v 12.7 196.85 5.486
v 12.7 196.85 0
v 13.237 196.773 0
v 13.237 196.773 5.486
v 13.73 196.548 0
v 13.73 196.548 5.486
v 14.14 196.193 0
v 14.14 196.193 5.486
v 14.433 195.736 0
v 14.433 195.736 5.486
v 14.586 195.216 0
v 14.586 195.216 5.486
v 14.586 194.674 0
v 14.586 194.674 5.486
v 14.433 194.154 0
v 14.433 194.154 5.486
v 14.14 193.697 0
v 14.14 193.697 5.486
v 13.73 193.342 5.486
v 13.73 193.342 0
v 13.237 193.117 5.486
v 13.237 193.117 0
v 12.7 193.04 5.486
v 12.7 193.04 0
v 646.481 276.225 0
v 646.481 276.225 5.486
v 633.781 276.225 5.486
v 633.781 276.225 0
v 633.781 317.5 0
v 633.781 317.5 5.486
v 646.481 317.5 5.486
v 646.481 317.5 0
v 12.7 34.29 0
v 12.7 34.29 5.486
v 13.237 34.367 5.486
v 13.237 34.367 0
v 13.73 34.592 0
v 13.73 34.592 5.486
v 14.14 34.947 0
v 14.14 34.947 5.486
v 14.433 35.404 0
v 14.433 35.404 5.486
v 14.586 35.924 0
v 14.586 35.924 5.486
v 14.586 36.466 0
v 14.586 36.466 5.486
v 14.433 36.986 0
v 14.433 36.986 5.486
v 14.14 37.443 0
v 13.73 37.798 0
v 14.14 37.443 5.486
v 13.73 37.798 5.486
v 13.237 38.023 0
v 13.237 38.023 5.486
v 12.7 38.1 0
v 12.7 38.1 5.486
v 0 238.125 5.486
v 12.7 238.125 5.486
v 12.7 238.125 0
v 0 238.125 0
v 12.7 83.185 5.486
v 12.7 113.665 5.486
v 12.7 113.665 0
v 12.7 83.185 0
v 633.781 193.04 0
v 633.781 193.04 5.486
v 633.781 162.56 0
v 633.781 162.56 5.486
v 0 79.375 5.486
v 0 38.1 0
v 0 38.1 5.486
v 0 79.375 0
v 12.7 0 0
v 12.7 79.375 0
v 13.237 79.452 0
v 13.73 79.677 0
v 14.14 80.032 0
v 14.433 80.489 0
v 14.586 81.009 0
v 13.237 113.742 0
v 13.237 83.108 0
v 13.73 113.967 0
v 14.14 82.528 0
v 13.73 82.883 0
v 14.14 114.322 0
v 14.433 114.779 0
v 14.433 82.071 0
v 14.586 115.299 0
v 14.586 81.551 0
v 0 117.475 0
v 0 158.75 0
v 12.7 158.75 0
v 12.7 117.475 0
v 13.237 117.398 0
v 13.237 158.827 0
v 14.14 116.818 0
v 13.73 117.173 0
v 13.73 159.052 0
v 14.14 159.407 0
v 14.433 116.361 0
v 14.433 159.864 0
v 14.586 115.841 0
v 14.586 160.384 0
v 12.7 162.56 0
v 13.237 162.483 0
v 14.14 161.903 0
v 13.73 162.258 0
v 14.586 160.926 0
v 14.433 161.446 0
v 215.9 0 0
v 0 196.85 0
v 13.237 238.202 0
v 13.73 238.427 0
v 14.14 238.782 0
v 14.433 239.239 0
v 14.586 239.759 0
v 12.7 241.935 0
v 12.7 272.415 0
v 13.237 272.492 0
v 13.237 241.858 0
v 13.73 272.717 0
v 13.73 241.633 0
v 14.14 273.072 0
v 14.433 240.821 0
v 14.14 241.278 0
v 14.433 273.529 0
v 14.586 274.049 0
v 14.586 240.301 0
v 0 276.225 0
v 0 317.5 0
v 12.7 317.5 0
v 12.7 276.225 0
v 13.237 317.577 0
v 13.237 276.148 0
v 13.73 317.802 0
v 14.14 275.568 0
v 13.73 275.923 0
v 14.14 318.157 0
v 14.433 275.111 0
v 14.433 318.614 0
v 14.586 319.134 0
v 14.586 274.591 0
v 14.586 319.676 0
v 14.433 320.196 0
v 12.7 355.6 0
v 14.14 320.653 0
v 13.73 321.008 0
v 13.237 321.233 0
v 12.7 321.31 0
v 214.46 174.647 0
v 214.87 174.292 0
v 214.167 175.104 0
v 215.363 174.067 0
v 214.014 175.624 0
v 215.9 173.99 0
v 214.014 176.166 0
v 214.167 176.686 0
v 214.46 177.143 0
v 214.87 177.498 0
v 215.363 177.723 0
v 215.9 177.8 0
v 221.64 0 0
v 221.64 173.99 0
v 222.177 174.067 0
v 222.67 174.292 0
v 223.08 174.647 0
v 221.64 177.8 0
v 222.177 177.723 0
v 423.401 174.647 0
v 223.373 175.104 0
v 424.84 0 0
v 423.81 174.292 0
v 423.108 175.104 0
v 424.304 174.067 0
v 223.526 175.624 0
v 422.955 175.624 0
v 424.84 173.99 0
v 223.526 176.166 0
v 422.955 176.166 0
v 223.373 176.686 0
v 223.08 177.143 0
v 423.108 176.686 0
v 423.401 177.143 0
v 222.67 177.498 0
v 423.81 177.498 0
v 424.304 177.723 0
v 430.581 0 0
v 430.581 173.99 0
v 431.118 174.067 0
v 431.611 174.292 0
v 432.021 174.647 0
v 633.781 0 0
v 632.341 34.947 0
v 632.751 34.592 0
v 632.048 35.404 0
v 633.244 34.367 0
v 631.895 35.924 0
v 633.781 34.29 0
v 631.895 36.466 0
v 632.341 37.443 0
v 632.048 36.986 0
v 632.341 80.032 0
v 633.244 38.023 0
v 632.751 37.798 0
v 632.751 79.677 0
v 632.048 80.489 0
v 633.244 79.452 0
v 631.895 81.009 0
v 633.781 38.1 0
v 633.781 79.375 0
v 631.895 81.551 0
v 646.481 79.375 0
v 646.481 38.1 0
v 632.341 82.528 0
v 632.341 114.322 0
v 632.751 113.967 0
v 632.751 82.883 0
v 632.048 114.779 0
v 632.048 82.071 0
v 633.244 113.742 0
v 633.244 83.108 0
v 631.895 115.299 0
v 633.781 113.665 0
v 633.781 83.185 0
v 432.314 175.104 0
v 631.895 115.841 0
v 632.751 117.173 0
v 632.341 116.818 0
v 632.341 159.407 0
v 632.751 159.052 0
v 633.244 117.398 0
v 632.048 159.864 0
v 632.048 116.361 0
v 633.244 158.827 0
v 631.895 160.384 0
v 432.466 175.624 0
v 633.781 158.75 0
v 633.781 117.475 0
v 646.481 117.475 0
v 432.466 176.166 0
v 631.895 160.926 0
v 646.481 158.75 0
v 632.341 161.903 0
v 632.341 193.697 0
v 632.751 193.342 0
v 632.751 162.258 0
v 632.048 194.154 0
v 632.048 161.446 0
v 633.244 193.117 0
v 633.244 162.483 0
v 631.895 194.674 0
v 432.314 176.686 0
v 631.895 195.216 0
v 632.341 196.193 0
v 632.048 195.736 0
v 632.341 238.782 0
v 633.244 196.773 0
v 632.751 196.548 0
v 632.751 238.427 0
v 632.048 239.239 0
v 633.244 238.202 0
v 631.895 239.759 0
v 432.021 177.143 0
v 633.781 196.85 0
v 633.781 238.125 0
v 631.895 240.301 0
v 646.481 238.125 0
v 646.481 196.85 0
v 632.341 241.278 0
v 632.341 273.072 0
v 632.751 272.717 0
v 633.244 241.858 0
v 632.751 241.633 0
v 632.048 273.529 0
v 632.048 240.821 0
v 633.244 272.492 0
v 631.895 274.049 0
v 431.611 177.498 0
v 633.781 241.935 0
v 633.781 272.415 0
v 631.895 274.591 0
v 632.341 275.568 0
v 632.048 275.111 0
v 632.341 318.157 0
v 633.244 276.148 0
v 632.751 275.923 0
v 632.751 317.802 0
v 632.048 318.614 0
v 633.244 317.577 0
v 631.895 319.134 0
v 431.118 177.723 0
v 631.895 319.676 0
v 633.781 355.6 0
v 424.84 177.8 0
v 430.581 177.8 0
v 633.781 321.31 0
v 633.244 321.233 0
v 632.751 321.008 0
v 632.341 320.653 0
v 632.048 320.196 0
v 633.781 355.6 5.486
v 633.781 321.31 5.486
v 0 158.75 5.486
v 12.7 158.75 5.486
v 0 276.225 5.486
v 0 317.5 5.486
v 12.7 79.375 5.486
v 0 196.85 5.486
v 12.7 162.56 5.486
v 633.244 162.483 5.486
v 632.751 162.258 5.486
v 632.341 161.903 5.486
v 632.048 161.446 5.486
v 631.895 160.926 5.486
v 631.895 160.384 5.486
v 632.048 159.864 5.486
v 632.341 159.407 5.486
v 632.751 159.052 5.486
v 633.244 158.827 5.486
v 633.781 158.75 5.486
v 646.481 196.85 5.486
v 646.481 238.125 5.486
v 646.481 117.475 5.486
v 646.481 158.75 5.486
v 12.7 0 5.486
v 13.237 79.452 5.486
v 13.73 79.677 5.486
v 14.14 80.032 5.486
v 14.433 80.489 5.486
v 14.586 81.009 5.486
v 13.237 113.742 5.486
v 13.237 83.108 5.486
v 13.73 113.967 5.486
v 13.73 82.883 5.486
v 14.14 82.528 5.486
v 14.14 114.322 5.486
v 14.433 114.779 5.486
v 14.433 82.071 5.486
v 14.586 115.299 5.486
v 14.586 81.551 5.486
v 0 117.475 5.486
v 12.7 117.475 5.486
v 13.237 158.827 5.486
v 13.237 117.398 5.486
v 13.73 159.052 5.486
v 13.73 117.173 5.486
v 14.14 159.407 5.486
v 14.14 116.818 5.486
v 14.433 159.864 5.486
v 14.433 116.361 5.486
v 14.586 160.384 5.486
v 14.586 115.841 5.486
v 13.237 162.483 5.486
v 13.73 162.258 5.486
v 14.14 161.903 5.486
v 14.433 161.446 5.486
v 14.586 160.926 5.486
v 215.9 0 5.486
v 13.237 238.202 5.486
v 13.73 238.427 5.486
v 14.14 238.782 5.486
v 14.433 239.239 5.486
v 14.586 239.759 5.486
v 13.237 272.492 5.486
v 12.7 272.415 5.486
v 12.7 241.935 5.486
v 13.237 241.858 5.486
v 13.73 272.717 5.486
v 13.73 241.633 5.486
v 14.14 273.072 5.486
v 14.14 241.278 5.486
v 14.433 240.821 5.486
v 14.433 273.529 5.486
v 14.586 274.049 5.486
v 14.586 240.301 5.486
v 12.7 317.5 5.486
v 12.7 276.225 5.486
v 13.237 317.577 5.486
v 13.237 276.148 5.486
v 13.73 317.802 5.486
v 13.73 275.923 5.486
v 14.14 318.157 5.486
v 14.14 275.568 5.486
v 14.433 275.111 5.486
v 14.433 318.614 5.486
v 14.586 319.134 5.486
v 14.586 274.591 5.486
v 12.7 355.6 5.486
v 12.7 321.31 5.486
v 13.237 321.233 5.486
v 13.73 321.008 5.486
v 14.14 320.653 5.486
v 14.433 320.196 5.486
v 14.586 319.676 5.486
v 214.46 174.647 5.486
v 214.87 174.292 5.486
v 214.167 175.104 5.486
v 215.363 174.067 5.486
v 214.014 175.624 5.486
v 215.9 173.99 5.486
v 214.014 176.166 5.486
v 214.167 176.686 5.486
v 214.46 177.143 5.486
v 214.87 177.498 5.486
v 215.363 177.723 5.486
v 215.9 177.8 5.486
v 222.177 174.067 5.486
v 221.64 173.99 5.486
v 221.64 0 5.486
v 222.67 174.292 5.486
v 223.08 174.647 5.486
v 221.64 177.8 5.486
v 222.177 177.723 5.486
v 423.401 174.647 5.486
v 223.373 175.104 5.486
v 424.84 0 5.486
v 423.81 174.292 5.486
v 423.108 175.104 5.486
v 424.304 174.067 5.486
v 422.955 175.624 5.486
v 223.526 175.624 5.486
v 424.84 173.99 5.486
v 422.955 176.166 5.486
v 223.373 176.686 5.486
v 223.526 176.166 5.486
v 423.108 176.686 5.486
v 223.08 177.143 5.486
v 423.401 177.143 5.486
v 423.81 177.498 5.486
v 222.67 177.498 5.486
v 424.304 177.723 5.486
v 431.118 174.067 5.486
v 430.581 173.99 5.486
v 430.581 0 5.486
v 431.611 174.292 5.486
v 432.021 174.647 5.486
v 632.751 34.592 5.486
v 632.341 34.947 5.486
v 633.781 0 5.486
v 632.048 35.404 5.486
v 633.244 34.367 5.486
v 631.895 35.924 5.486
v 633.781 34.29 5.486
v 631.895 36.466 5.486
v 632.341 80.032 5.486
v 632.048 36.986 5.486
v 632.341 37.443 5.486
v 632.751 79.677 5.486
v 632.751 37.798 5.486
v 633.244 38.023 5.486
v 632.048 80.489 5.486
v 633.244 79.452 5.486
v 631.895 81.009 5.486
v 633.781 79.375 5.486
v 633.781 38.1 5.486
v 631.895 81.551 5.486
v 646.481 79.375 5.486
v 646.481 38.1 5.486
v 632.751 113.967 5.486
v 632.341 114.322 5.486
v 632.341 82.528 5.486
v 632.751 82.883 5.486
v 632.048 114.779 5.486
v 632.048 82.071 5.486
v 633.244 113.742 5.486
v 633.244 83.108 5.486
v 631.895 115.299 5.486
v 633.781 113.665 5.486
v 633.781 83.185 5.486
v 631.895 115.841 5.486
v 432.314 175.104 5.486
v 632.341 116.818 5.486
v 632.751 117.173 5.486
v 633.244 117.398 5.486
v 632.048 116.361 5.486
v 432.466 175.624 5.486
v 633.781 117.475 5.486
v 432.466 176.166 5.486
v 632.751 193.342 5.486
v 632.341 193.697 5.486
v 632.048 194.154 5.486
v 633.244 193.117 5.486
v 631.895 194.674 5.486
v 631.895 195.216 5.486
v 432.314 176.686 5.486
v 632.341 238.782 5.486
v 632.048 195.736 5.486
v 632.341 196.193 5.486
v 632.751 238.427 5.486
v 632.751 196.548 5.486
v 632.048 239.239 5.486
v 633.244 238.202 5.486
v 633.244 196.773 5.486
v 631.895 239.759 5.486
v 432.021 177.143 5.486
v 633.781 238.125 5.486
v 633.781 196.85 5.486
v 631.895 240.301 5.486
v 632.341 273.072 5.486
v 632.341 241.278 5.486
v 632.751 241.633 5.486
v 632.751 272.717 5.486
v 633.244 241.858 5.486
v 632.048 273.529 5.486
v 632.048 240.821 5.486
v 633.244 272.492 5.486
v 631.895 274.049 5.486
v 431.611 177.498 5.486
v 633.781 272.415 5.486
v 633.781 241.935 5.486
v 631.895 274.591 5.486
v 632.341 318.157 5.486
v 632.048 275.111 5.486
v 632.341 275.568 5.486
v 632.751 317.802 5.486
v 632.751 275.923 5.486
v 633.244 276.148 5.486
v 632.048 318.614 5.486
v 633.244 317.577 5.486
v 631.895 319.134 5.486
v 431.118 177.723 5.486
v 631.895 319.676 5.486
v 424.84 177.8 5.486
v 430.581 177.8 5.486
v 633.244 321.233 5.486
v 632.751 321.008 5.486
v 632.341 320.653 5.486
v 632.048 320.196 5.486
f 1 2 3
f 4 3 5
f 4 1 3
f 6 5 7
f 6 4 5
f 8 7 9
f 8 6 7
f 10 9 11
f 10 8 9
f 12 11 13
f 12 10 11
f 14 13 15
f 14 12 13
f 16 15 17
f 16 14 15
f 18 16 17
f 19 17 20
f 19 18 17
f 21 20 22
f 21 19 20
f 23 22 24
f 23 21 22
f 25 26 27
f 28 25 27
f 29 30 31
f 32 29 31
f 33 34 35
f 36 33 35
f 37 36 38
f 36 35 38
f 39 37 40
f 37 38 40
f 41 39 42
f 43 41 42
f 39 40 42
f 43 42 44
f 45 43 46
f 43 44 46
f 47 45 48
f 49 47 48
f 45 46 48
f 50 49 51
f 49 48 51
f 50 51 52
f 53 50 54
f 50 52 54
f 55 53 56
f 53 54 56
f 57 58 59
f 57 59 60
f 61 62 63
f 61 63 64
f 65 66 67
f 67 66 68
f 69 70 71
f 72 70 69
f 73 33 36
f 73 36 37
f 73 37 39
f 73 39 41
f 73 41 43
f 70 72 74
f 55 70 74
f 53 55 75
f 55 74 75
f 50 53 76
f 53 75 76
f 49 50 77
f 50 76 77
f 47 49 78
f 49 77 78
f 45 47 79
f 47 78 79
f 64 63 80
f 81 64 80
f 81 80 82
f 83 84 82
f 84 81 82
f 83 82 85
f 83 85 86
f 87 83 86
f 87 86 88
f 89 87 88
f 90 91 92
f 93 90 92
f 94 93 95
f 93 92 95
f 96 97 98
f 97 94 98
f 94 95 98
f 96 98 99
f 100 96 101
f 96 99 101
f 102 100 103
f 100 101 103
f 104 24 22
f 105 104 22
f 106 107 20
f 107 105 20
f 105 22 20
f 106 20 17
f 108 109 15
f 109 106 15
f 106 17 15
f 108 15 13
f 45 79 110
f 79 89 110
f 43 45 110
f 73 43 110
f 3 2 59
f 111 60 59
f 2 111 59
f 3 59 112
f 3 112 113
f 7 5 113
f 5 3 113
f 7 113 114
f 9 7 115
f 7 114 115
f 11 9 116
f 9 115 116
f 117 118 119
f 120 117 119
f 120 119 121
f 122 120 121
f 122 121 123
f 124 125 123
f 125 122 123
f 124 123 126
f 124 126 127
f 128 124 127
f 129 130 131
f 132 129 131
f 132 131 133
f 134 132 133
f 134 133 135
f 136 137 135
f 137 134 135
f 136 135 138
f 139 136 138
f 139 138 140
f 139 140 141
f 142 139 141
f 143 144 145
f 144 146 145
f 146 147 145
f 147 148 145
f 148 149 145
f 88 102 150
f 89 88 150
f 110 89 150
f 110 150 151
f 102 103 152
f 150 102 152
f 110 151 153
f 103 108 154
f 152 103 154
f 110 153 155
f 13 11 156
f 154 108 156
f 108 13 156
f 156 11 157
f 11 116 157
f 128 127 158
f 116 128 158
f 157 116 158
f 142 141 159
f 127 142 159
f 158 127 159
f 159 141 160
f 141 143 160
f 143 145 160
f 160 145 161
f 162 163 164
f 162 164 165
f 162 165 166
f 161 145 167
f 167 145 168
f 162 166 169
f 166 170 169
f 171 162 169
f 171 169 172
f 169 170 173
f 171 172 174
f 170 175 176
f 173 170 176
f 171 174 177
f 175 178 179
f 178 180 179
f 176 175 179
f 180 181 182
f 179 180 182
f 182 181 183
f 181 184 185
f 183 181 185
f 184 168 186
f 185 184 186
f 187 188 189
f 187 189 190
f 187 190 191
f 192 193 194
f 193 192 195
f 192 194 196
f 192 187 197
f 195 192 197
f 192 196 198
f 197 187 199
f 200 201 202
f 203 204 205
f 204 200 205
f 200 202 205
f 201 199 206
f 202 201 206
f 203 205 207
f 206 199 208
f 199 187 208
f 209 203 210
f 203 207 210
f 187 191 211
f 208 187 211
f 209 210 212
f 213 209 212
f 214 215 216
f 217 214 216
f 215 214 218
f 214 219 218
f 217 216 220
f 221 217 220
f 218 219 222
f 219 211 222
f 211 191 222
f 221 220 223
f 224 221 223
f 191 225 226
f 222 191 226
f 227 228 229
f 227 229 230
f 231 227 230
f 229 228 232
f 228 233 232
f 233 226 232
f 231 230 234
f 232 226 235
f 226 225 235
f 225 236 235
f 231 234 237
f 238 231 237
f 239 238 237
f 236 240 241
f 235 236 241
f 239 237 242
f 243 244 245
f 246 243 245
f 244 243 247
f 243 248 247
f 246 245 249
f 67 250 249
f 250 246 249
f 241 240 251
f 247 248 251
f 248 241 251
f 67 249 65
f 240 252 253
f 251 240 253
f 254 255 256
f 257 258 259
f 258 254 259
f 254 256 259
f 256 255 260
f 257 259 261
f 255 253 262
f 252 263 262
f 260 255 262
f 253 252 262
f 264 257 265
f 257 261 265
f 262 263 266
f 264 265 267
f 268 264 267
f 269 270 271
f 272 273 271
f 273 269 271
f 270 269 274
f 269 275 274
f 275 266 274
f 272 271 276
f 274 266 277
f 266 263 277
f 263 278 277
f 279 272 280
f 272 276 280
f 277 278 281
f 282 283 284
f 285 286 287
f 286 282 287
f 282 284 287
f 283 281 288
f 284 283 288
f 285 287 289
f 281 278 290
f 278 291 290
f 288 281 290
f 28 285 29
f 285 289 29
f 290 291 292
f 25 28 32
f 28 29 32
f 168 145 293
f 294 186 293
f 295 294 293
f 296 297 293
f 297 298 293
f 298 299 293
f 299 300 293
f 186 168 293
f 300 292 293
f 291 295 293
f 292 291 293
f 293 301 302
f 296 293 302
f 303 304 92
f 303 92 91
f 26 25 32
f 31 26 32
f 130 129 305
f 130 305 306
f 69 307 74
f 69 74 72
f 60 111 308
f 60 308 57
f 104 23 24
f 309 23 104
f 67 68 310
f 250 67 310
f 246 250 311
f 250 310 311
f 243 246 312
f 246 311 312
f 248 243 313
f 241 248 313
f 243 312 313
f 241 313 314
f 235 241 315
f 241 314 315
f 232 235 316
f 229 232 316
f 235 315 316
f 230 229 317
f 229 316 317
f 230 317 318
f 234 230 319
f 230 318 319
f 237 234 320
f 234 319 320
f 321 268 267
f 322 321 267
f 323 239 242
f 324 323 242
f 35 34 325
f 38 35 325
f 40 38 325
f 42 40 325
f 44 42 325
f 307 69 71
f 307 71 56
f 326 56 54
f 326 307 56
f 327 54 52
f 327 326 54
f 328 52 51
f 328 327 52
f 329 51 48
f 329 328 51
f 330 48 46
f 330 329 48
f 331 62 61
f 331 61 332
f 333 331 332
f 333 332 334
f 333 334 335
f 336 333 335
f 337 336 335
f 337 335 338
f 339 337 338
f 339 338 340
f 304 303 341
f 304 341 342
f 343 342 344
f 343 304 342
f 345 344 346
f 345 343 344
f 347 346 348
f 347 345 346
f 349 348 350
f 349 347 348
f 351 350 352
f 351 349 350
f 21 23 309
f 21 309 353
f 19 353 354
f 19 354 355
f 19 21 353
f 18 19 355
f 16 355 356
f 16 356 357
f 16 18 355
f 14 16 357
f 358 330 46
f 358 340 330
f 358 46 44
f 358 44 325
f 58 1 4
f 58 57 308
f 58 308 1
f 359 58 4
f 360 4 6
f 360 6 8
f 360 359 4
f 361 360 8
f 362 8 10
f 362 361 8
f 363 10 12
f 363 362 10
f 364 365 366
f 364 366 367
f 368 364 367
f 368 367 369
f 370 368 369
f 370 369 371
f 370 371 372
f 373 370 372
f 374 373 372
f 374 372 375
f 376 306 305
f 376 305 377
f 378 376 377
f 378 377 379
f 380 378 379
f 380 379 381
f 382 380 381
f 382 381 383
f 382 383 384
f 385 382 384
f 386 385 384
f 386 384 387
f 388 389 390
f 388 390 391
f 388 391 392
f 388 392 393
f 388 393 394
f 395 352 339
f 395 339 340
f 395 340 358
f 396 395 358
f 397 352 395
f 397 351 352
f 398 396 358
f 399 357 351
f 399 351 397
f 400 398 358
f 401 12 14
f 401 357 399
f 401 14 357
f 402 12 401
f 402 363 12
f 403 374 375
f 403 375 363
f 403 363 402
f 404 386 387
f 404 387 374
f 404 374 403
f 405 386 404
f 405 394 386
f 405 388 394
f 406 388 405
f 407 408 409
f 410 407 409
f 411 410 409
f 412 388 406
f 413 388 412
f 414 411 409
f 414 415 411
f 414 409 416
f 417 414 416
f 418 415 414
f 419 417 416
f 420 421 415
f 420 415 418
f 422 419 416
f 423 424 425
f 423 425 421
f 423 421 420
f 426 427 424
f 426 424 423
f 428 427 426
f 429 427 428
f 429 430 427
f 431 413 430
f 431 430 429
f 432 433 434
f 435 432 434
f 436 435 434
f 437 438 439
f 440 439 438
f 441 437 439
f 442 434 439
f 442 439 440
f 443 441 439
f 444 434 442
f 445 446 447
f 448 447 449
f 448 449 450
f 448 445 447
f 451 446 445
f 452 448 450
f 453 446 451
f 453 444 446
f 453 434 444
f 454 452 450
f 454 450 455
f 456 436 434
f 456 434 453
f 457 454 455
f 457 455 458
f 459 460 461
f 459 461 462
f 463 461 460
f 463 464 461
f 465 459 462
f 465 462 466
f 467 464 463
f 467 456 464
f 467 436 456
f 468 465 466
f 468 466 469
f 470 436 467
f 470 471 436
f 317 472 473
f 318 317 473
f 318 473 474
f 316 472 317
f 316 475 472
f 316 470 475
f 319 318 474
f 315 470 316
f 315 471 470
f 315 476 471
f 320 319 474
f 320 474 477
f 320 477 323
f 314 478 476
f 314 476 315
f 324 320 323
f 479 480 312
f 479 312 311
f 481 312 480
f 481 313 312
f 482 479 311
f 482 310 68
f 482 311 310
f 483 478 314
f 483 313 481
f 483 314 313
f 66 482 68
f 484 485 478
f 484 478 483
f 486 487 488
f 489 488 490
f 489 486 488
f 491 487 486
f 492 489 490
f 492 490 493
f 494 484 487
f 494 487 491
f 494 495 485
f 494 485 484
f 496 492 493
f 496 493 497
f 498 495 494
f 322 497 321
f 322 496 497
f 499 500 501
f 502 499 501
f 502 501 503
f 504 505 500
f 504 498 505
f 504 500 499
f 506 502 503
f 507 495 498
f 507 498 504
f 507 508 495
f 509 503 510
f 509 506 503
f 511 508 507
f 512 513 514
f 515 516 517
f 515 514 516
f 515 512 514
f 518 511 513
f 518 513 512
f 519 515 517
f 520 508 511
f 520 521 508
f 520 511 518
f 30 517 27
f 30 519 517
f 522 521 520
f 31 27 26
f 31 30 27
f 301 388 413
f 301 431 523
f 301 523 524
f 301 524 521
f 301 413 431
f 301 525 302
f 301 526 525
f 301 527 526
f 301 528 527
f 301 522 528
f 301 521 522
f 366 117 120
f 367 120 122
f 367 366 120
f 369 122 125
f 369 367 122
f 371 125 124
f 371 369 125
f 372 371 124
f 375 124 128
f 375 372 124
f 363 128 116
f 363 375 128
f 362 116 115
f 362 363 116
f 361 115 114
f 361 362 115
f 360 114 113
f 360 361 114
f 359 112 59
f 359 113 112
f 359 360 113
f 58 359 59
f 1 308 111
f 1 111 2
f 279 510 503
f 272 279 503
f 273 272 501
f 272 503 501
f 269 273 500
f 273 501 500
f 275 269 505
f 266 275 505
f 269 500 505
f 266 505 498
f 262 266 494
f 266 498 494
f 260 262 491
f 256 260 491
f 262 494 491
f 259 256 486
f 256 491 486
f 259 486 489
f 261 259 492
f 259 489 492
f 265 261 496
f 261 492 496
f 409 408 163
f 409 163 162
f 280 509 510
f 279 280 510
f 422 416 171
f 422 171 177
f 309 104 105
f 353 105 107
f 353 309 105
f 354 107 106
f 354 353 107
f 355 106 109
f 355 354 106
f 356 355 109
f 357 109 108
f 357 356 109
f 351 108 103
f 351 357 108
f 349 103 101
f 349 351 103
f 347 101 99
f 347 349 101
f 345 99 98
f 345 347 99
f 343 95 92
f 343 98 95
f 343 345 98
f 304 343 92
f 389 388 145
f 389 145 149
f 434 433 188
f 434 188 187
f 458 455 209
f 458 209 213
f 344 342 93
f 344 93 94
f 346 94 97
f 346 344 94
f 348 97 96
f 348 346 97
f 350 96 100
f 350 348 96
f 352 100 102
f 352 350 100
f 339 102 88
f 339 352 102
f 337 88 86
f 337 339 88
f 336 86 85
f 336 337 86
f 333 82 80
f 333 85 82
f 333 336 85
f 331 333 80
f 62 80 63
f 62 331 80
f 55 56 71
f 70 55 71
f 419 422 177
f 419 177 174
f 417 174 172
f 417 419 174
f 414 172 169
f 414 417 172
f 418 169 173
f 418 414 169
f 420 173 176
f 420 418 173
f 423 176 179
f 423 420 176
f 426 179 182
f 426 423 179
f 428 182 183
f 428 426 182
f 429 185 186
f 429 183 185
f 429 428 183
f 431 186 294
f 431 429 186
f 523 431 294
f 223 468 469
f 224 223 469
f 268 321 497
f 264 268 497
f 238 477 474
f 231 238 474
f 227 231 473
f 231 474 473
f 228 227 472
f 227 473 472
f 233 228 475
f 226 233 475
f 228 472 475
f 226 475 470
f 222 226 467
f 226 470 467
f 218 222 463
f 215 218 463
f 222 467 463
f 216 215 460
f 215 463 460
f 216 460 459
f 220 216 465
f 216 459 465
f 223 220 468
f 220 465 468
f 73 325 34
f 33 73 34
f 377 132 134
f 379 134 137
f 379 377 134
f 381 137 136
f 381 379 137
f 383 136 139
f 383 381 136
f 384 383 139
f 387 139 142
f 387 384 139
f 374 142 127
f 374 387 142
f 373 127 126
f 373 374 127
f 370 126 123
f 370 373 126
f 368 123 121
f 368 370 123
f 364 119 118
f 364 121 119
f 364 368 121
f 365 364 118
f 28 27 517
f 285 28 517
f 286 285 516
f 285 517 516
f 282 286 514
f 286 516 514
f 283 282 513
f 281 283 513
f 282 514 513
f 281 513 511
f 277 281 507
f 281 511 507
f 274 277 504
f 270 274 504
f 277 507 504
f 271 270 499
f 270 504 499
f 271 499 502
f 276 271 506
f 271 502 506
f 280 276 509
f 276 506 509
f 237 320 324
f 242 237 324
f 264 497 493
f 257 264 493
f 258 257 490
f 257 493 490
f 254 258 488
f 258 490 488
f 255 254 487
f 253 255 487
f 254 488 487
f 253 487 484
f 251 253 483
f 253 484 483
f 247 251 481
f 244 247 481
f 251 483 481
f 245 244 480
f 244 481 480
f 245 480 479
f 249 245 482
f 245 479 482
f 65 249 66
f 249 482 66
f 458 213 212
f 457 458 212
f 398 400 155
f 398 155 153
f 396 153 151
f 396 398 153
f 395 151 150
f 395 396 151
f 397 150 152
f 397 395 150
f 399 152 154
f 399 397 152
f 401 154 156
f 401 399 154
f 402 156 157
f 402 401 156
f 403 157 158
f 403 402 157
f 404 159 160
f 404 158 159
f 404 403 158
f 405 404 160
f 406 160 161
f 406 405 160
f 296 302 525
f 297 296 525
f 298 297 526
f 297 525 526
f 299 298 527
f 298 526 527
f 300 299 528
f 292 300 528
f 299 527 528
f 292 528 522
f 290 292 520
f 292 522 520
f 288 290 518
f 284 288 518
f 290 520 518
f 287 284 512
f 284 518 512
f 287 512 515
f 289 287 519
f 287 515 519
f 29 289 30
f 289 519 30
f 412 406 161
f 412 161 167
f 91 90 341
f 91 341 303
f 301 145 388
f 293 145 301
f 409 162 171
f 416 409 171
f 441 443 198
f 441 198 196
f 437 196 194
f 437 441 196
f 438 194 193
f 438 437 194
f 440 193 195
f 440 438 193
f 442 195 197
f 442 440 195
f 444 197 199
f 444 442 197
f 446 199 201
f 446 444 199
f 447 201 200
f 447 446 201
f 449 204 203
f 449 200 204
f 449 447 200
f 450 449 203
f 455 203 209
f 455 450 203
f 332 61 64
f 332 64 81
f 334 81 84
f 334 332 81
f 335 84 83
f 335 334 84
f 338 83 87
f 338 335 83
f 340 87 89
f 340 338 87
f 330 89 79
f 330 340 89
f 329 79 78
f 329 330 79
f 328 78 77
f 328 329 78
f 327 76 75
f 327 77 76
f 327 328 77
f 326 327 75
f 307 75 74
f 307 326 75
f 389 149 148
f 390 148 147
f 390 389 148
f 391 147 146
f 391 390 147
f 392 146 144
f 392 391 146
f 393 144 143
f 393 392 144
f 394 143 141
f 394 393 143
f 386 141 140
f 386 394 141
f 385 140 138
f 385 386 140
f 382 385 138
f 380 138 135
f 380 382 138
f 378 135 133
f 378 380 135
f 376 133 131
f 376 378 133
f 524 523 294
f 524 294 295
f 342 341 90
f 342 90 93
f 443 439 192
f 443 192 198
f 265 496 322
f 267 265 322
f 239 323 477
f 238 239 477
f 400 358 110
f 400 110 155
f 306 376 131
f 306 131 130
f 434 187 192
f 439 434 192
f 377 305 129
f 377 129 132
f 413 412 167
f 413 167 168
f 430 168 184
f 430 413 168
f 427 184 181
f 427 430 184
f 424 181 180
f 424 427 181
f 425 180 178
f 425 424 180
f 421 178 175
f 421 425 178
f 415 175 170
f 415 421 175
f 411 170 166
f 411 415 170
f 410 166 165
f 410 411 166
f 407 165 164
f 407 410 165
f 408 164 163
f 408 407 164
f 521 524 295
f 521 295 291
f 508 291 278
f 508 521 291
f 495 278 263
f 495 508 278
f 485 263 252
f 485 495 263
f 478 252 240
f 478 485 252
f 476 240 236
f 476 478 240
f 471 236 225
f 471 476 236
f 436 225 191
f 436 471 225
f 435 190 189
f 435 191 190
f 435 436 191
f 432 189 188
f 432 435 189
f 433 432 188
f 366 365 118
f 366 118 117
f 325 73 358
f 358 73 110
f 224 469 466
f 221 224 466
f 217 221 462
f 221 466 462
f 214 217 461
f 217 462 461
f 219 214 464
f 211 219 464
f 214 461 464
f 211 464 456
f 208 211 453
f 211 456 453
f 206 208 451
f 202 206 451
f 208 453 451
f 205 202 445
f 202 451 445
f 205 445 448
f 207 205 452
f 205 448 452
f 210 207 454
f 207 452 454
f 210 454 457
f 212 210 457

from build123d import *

# Parameters (mm, degrees)
SKETCH1_W           = 646.4808
SKETCH1_H           = 355.6
BOSS_EXTRUDE1_DEPTH = 5.4864
CUT_EXTRUDE1_DEPTH  = 738.847467539
CUT_EXTRUDE2_DEPTH  = 738.847467539


with BuildPart() as part:
    # Sketch1 → Boss-Extrude1 (new body)
    with BuildSketch(Plane.XY):
        with Locations((323.2404, 177.8)):
            Rectangle(SKETCH1_W, SKETCH1_H)
    extrude(amount=BOSS_EXTRUDE1_DEPTH)

    # Sketch4 → Cut-Extrude1 (cut, through all)
    with BuildSketch(Plane.XY.offset(5.4864)):
        with BuildLine():
            Line((424.8404, 177.8), (430.5808, 177.8))
            ThreePointArc((430.5808, 177.8), (432.4858, 175.895), (430.5808, 173.99))
            Line((430.5808, 173.99), (430.5808, 0))
            Line((430.5808, 0), (424.8404, 0))
            Line((424.8404, 0), (424.8404, 173.99))
            ThreePointArc((424.8404, 173.99), (422.9354, 175.895), (424.8404, 177.8))
        make_face()
        with BuildLine():
            Line((215.9, 177.8), (221.6404, 177.8))
            ThreePointArc((221.6404, 177.8), (223.5454, 175.895), (221.6404, 173.99))
            Line((221.6404, 173.99), (221.6404, 0))
            Line((221.6404, 0), (215.9, 0))
            Line((215.9, 0), (215.9, 173.99))
            ThreePointArc((215.9, 173.99), (213.995, 175.895), (215.9, 177.8))
        make_face()
    extrude(amount=-CUT_EXTRUDE1_DEPTH, mode=Mode.SUBTRACT)

    # Sketch5 → Cut-Extrude2 (cut, through all)
    with BuildSketch(Plane.XY.offset(5.4864)):
        with BuildLine():
            Line((0, 0), (12.7, 0))
            Line((12.7, 0), (12.7, 3.81))
            Line((12.7, 3.81), (12.7, 34.29))
            ThreePointArc((12.7, 34.29), (14.605, 36.195), (12.7, 38.1))
            Line((12.7, 38.1), (0, 38.1))
            ThreePointArc((0, 38.1), (-1.905, 36.195), (0, 34.29))
            Line((0, 34.29), (0, 3.81))
            ThreePointArc((0, 3.81), (-1.905, 1.905), (0, 0))
        make_face()
        with BuildLine():
            Line((0, 117.475), (12.7, 117.475))
            ThreePointArc((12.7, 117.475), (14.605, 115.57), (12.7, 113.665))
            Line((12.7, 113.665), (12.7, 83.185))
            ThreePointArc((12.7, 83.185), (14.605, 81.28), (12.7, 79.375))
            Line((12.7, 79.375), (0, 79.375))
            ThreePointArc((0, 79.375), (-1.905, 81.28), (0, 83.185))
            Line((0, 83.185), (0, 113.665))
            ThreePointArc((0, 113.665), (-1.905, 115.57), (0, 117.475))
        make_face()
        with BuildLine():
            Line((0, 196.85), (12.7, 196.85))
            ThreePointArc((12.7, 196.85), (14.605, 194.945), (12.7, 193.04))
            Line((12.7, 193.04), (12.7, 162.56))
            ThreePointArc((12.7, 162.56), (14.605, 160.655), (12.7, 158.75))
            Line((12.7, 158.75), (0, 158.75))
            ThreePointArc((0, 158.75), (-1.905, 160.655), (0, 162.56))
            Line((0, 162.56), (0, 193.04))
            ThreePointArc((0, 193.04), (-1.905, 194.945), (0, 196.85))
        make_face()
        with BuildLine():
            Line((0, 276.225), (12.7, 276.225))
            ThreePointArc((12.7, 276.225), (14.605, 274.32), (12.7, 272.415))
            Line((12.7, 272.415), (12.7, 241.935))
            ThreePointArc((12.7, 241.935), (14.605, 240.03), (12.7, 238.125))
            Line((12.7, 238.125), (0, 238.125))
            ThreePointArc((0, 238.125), (-1.905, 240.03), (0, 241.935))
            Line((0, 241.935), (0, 272.415))
            ThreePointArc((0, 272.415), (-1.905, 274.32), (0, 276.225))
        make_face()
        with BuildLine():
            Line((0, 355.6), (12.7, 355.6))
            Line((12.7, 355.6), (12.7, 351.79))
            Line((12.7, 351.79), (12.7, 321.31))
            ThreePointArc((12.7, 321.31), (14.605, 319.405), (12.7, 317.5))
            Line((12.7, 317.5), (0, 317.5))
            ThreePointArc((0, 317.5), (-1.905, 319.405), (0, 321.31))
            Line((0, 321.31), (0, 351.79))
            ThreePointArc((0, 351.79), (-1.905, 353.695), (0, 355.6))
        make_face()
        with BuildLine():
            Line((646.4808, 321.31), (646.4808, 351.79))
            ThreePointArc((646.4808, 351.79), (648.3858, 353.695), (646.4808, 355.6))
            Line((646.4808, 355.6), (633.7808, 355.6))
            Line((633.7808, 355.6), (633.7808, 351.79))
            Line((633.7808, 351.79), (633.7808, 321.31))
            ThreePointArc((633.7808, 321.31), (631.8758, 319.405), (633.7808, 317.5))
            Line((633.7808, 317.5), (646.4808, 317.5))
            ThreePointArc((646.4808, 317.5), (648.3858, 319.405), (646.4808, 321.31))
        make_face()
        with BuildLine():
            Line((646.4808, 241.935), (646.4808, 272.415))
            ThreePointArc((646.4808, 272.415), (648.3858, 274.32), (646.4808, 276.225))
            Line((646.4808, 276.225), (633.7808, 276.225))
            ThreePointArc((633.7808, 276.225), (631.8758, 274.32), (633.7808, 272.415))
            Line((633.7808, 272.415), (633.7808, 241.935))
            ThreePointArc((633.7808, 241.935), (631.8758, 240.03), (633.7808, 238.125))
            Line((633.7808, 238.125), (646.4808, 238.125))
            ThreePointArc((646.4808, 238.125), (648.3858, 240.03), (646.4808, 241.935))
        make_face()
        with BuildLine():
            Line((646.4808, 162.56), (646.4808, 193.04))
            ThreePointArc((646.4808, 193.04), (648.3858, 194.945), (646.4808, 196.85))
            Line((646.4808, 196.85), (633.7808, 196.85))
            ThreePointArc((633.7808, 196.85), (631.8758, 194.945), (633.7808, 193.04))
            Line((633.7808, 193.04), (633.7808, 162.56))
            ThreePointArc((633.7808, 162.56), (631.8758, 160.655), (633.7808, 158.75))
            Line((633.7808, 158.75), (646.4808, 158.75))
            ThreePointArc((646.4808, 158.75), (648.3858, 160.655), (646.4808, 162.56))
        make_face()
        with BuildLine():
            Line((646.4808, 83.185), (646.4808, 113.665))
            ThreePointArc((646.4808, 113.665), (648.3858, 115.57), (646.4808, 117.475))
            Line((646.4808, 117.475), (633.7808, 117.475))
            ThreePointArc((633.7808, 117.475), (631.8758, 115.57), (633.7808, 113.665))
            Line((633.7808, 113.665), (633.7808, 83.185))
            ThreePointArc((633.7808, 83.185), (631.8758, 81.28), (633.7808, 79.375))
            Line((633.7808, 79.375), (646.4808, 79.375))
            ThreePointArc((646.4808, 79.375), (648.3858, 81.28), (646.4808, 83.185))
        make_face()
        with BuildLine():
            Line((633.7808, 3.81), (633.7808, 34.29))
            ThreePointArc((633.7808, 34.29), (631.8758, 36.195), (633.7808, 38.1))
            Line((633.7808, 38.1), (646.4808, 38.1))
            ThreePointArc((646.4808, 38.1), (648.3858, 36.195), (646.4808, 34.29))
            Line((646.4808, 34.29), (646.4808, 3.81))
            ThreePointArc((646.4808, 3.81), (648.3858, 1.905), (646.4808, 0))
            Line((646.4808, 0), (633.7808, 0))
            Line((633.7808, 0), (633.7808, 3.81))
        make_face()
    extrude(amount=-CUT_EXTRUDE2_DEPTH, mode=Mode.SUBTRACT)


solid = part.part
